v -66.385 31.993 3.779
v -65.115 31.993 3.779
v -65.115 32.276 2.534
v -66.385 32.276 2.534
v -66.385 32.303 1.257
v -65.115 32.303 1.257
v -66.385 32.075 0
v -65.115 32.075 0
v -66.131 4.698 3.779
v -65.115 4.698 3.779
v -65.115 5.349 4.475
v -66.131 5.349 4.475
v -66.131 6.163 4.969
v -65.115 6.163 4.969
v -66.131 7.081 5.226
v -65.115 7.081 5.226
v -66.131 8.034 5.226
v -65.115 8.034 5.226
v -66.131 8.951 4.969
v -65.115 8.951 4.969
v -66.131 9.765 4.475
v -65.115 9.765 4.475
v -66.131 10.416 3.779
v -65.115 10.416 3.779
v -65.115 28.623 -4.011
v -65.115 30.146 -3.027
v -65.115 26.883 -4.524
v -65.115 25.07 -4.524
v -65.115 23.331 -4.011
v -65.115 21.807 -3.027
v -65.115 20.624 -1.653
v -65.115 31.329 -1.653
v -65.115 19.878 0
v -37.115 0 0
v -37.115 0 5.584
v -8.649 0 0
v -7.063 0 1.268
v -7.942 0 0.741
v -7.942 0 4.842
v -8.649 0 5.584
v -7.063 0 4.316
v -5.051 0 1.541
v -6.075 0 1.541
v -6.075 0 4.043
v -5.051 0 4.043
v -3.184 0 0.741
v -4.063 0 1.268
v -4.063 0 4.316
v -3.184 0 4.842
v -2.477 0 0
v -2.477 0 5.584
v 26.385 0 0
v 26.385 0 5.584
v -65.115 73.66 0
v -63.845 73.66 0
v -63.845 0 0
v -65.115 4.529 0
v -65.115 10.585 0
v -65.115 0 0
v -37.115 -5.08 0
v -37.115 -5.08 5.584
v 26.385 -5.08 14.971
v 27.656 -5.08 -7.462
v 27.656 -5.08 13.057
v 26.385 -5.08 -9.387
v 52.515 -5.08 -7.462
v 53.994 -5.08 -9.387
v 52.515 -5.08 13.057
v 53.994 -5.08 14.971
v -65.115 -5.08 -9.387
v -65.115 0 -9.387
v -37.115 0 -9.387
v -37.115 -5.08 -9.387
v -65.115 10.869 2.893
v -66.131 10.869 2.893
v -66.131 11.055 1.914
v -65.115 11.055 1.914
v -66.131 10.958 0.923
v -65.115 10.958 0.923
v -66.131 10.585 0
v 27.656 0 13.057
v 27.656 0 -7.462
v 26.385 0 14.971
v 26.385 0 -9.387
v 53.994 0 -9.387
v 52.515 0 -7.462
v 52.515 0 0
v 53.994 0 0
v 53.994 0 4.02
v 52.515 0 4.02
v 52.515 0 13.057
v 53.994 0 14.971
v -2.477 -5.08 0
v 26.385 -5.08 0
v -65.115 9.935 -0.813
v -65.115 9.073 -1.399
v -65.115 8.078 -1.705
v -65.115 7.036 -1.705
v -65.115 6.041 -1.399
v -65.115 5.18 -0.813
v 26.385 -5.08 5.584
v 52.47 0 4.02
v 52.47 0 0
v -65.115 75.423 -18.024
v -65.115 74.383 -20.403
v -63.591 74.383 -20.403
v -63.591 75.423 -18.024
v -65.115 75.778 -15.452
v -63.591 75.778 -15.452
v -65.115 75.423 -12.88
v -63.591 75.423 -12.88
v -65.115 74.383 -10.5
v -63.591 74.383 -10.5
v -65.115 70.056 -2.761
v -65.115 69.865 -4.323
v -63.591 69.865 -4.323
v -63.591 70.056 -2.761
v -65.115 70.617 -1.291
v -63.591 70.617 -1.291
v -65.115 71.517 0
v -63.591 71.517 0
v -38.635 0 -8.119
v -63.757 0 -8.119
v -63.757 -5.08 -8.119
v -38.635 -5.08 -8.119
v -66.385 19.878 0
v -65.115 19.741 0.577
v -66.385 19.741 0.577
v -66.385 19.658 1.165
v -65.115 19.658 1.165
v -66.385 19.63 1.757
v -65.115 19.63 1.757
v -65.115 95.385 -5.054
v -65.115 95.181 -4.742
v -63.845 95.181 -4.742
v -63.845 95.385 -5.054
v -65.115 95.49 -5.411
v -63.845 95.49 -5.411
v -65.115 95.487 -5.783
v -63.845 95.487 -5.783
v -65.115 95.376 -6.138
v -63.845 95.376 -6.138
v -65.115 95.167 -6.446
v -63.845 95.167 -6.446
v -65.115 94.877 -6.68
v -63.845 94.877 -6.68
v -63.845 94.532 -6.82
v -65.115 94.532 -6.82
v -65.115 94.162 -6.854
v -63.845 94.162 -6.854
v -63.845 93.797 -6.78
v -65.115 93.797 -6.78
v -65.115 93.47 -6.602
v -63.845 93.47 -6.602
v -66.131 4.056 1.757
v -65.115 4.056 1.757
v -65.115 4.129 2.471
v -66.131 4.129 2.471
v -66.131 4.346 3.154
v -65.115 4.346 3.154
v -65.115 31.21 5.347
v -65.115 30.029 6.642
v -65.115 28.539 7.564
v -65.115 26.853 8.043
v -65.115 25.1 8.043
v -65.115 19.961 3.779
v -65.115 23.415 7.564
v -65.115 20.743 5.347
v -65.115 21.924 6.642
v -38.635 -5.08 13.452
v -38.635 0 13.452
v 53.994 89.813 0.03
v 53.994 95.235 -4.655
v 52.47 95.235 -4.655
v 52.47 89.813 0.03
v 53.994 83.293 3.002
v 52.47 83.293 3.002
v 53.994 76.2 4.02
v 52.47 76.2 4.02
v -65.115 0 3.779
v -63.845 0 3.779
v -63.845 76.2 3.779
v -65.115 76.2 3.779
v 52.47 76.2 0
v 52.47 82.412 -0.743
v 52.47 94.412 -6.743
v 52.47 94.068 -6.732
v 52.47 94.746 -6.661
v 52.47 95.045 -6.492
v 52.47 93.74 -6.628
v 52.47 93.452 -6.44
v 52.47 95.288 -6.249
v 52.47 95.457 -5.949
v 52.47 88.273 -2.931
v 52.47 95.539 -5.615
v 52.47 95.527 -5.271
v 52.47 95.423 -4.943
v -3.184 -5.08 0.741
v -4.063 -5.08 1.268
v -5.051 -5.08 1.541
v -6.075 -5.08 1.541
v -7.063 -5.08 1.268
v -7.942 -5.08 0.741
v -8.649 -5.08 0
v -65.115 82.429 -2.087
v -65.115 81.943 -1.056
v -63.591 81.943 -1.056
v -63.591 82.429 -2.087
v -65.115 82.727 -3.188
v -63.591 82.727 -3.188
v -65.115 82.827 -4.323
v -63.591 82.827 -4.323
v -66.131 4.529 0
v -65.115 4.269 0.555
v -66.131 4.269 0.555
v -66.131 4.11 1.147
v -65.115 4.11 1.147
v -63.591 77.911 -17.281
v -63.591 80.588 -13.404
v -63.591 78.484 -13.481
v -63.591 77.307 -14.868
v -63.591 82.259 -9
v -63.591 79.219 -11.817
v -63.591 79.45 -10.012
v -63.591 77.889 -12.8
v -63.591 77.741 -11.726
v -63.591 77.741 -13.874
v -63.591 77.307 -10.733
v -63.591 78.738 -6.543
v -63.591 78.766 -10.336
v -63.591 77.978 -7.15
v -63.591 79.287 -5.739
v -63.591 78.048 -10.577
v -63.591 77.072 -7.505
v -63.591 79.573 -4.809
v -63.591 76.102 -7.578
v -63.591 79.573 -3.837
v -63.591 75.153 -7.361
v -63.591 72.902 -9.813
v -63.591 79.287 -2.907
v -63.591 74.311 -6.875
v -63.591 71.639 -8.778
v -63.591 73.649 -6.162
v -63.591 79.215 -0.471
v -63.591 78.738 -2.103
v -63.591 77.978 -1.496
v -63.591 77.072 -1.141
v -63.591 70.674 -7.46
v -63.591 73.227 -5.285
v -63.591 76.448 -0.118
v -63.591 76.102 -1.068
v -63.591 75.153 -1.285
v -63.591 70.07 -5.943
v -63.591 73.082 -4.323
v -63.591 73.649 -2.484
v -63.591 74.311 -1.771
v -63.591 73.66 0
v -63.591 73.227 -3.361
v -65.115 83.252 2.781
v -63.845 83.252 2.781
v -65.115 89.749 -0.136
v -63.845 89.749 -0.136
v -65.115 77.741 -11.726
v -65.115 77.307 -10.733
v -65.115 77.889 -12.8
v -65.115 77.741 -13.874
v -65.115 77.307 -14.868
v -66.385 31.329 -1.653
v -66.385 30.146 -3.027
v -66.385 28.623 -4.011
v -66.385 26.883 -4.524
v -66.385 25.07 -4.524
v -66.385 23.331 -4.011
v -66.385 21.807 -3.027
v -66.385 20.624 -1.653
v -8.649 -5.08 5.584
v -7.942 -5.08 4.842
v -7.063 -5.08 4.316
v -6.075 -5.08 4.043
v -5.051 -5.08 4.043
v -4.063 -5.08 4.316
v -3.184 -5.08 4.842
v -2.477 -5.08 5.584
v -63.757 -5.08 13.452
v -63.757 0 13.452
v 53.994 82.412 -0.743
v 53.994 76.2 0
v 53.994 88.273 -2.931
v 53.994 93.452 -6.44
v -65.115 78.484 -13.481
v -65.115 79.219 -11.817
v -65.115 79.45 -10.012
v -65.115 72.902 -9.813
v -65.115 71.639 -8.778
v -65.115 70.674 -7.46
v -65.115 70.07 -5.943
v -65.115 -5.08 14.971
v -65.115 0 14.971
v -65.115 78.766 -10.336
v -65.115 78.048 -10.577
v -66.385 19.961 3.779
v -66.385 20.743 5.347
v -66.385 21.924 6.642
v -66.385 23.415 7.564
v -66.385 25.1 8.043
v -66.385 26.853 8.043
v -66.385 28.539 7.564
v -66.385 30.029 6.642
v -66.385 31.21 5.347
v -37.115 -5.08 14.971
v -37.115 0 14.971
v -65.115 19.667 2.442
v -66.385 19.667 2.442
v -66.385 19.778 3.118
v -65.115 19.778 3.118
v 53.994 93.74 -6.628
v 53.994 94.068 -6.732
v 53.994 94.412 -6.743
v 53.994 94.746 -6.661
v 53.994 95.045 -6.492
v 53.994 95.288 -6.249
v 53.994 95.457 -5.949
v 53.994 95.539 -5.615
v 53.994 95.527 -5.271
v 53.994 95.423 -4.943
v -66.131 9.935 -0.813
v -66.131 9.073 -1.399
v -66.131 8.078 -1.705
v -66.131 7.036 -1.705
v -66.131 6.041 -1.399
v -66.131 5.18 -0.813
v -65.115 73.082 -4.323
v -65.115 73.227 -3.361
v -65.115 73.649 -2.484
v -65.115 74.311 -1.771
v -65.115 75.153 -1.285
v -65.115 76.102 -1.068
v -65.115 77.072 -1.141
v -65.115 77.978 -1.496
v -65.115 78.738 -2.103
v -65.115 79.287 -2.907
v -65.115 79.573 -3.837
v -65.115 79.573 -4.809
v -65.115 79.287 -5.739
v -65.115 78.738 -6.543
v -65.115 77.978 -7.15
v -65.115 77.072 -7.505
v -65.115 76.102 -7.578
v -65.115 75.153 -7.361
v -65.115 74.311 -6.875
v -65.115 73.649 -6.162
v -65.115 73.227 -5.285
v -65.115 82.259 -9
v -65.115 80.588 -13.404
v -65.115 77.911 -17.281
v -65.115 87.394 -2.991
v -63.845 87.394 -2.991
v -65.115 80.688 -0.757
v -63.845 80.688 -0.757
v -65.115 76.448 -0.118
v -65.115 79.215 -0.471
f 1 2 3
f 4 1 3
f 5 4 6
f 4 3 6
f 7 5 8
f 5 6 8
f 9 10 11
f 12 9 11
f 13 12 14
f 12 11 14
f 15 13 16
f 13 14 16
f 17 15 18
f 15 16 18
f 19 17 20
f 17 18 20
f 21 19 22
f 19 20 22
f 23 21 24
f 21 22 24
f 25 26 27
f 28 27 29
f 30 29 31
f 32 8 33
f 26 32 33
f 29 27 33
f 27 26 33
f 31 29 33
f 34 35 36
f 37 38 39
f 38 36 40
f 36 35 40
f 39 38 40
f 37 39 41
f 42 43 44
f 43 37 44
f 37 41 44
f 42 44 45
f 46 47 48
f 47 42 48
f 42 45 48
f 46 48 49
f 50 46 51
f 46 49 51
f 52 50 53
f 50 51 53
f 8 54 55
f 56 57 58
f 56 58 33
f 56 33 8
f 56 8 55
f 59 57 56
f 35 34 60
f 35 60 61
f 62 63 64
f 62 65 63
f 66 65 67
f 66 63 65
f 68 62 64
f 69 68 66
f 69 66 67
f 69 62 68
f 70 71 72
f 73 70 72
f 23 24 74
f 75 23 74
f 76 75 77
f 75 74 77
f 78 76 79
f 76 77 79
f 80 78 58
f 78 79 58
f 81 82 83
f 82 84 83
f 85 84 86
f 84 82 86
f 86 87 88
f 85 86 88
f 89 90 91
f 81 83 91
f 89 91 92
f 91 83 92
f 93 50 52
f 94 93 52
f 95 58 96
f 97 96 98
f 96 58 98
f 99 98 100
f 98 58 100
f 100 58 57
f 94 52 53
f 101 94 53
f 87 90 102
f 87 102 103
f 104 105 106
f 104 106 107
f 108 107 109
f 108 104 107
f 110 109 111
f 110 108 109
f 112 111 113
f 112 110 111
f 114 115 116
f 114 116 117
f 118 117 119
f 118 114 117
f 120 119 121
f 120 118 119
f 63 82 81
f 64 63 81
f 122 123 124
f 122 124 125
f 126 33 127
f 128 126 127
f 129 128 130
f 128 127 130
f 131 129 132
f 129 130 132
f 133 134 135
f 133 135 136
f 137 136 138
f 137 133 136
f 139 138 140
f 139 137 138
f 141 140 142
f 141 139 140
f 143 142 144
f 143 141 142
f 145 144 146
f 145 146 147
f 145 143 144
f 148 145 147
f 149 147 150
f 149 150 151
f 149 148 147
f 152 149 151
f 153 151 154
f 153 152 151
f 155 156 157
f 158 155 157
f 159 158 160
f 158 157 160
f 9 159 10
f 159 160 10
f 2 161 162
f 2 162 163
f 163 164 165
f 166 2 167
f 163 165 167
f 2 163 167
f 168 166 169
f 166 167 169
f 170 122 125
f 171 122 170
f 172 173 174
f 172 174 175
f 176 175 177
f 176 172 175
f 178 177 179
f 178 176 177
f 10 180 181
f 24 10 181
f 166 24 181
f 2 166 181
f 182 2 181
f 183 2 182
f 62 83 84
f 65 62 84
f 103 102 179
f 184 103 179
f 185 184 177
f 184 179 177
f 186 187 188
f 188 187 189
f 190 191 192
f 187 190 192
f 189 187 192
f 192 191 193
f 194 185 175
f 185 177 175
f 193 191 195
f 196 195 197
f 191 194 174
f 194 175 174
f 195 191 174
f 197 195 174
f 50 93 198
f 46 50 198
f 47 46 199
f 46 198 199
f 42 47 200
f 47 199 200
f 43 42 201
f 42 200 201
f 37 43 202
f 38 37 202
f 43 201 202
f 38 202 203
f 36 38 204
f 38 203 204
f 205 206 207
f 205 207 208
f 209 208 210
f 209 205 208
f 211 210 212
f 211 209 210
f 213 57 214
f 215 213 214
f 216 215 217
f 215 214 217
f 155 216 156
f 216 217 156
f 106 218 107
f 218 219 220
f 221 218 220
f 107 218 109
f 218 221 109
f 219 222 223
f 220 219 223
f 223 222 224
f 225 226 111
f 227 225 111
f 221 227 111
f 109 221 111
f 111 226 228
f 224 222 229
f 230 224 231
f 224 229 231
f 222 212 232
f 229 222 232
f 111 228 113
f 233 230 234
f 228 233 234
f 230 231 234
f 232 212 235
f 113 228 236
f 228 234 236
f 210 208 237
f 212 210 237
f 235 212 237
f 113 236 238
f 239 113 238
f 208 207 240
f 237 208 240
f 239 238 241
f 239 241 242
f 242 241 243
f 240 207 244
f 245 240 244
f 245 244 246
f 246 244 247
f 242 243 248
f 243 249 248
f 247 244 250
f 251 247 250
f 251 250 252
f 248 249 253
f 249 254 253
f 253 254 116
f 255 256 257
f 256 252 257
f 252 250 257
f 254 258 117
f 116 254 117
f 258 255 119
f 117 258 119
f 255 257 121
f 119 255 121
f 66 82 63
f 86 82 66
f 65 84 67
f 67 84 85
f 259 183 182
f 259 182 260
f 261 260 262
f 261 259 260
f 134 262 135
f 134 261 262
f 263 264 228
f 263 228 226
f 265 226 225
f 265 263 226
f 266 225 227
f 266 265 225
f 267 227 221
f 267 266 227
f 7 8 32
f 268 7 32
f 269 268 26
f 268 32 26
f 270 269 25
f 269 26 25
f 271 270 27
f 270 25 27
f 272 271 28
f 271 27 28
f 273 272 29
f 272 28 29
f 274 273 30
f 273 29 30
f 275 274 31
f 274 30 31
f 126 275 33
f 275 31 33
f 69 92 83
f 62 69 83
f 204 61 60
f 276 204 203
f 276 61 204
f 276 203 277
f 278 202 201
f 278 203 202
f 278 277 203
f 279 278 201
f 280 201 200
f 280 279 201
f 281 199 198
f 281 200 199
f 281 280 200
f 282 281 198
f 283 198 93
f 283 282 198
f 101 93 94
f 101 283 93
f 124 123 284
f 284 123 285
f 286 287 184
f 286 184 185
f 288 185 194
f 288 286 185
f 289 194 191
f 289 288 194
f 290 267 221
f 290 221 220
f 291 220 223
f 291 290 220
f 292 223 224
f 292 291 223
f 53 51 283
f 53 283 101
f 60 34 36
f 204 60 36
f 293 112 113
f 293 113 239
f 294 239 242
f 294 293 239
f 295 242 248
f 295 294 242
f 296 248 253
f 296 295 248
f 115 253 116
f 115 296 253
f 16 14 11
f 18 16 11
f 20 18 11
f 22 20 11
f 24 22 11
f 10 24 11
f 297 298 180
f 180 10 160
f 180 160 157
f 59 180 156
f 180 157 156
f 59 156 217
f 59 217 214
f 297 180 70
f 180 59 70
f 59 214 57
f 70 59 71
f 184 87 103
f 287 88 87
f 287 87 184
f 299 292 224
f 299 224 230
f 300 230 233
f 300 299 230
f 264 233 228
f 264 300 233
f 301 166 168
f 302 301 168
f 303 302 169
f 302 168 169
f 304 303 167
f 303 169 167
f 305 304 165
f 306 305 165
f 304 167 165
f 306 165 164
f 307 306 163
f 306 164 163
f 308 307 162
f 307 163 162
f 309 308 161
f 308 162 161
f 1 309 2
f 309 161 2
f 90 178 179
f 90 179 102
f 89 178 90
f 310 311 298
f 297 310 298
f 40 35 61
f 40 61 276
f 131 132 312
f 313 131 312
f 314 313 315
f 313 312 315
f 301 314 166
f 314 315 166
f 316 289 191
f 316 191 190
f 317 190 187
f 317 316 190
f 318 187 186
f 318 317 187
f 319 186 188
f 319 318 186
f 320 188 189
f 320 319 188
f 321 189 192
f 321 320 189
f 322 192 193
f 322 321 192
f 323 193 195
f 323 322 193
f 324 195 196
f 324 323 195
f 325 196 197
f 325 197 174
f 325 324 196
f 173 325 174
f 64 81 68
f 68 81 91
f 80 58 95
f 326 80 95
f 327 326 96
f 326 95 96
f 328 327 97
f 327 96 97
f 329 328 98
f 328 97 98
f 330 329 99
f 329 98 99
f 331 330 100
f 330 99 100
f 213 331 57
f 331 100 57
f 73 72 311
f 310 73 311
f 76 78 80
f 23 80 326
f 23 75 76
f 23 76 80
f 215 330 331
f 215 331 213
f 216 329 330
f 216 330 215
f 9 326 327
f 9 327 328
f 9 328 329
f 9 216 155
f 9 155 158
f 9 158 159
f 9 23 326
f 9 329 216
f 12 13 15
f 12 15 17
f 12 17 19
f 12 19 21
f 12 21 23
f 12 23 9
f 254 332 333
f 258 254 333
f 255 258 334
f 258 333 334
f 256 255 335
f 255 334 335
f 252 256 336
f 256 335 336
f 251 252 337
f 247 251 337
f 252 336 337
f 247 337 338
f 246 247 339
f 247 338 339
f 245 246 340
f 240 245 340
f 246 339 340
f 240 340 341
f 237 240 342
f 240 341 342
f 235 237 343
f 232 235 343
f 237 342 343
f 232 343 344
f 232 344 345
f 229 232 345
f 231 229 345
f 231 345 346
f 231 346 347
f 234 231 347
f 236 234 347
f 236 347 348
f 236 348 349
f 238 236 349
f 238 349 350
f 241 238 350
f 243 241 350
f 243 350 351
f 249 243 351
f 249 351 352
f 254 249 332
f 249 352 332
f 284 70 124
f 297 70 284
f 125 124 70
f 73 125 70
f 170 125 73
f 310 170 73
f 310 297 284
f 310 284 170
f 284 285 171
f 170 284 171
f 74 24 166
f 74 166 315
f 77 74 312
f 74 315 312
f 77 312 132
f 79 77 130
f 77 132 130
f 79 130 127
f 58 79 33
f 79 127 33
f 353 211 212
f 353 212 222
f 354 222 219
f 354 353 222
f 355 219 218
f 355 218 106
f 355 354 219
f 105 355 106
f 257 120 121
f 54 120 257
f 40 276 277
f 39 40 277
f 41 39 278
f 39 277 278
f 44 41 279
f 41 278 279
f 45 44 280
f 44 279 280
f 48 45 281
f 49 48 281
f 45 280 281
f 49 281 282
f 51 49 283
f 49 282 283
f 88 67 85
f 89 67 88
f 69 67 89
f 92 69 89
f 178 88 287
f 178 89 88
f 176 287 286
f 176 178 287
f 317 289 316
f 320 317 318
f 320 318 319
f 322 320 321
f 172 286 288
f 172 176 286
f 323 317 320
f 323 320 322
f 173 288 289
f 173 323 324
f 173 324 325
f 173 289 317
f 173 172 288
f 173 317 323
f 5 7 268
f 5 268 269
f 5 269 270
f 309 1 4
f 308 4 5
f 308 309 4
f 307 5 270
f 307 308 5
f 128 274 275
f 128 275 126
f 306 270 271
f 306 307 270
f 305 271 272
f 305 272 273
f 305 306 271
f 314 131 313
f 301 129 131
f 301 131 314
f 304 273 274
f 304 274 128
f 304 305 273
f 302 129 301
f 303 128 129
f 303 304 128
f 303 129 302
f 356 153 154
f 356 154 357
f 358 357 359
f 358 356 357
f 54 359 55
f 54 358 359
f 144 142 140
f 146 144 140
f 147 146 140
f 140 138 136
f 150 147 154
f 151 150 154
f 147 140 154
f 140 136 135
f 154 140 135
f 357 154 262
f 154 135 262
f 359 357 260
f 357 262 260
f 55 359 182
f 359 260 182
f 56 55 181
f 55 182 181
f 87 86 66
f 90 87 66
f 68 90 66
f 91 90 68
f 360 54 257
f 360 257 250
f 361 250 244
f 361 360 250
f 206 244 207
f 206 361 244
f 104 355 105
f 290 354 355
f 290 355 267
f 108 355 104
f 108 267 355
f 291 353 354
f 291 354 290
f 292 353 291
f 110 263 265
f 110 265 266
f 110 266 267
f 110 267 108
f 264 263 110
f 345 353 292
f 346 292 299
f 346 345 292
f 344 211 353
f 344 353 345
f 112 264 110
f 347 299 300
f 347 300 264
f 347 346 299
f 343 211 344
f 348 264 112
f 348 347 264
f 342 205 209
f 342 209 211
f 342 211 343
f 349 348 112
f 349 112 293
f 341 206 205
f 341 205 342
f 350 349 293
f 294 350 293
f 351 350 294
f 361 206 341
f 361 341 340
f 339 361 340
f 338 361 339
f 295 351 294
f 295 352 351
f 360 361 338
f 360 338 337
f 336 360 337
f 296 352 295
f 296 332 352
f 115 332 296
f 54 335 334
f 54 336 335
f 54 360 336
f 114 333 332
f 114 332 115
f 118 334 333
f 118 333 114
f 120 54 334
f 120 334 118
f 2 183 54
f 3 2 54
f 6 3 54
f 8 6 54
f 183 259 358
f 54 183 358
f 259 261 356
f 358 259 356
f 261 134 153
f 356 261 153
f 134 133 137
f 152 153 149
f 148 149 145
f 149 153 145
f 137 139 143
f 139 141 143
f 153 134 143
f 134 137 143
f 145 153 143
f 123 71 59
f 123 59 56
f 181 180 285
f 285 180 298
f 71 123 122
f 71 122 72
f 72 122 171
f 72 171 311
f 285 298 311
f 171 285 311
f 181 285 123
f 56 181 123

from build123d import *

# Parameters (mm, degrees)
F0_W      = 24.8591314353
F0_H      = 20.5186494302
F1_DEPTH  = 5.08
F0_W_2    = 25.122191595
F0_H_2    = 21.5708865258
F2_DEPTH  = 5.08
F0_W_3    = 63.5
F0_H_3    = 5.5836134831
F3_DEPTH  = 5.08
F5_DEPTH  = 1.27
F7_DEPTH  = 1.524
F9_DEPTH  = 25.4
F10_R     = 3.2639449121
F11_DEPTH = 1.524
F12_DEPTH = 25.4
F14_DEPTH = 1.016
F15_DEPTH = 1.27


with BuildPart() as f1:
    # F0 (on Front) → F1 (new body)
    with BuildSketch(Plane.XZ):
        Polygon((26.385391636, 14.9705700048), (26.385391636, 5.5836134831), (26.385391636, 0), (26.385391636, -9.3869565217), (53.9940872881, -9.3869565217), (53.9940872881, 14.9705700048), align=None)
        with Locations((40.0855276815, 2.7977904487)):
            Rectangle(F0_W, F0_H, mode=Mode.SUBTRACT)
    extrude(amount=F1_DEPTH)

    # F0 (on Front) → F2 (cut)
    with BuildSketch(Plane.XZ):
        with Locations((-51.196154369, 2.6662601158)):
            Rectangle(F0_W_2, F0_H_2)
        with Locations((40.0855276815, 2.7977904487)):
            Rectangle(F0_W, F0_H)
    extrude(amount=F2_DEPTH, mode=Mode.SUBTRACT)

    # F6 (on face) → F7 (join)
    with BuildSketch(Plane.YZ.offset(53.9940872881)):
        with BuildLine():
            Line((76.2000307441, 4.0195993367), (0, 4.0195993367))
            Line((0, 4.0195993367), (0, 0))
            Line((0, 0), (76.2000307441, 0))
            ThreePointArc((76.2000307441, 0), (85.4073462963, -1.6626049581), (93.451687857, -6.440416568))
            ThreePointArc((93.451687857, -6.440416568), (95.175242601, -6.3789570267), (95.2350281051, -4.6553434028))
            ThreePointArc((95.2350281051, -4.6553434028), (86.6593060066, 1.7486216939), (76.2000307441, 4.0195993367))
        make_face()
    extrude(amount=-F7_DEPTH)

    # F10 (on face) → F12 (cut)
    with BuildSketch(Plane(origin=(-65.1145180239, 0, 0), x_dir=(0, -1, 0), z_dir=(-1, 0, 0))):
        with Locations((-76.3458460569, -4.3230298907)):
            Circle(F10_R)
        with BuildLine():
            ThreePointArc((-77.3066952825, -10.7327000518), (-78.4101509232, -10.4667867403), (-79.450295985, -10.0124493208))
            ThreePointArc((-79.450295985, -10.0124493208), (-78.9112272655, -12.6753163205), (-77.3066952825, -14.8677881807))
            ThreePointArc((-77.3066952825, -14.8677881807), (-77.8892778547, -12.8002441162), (-77.3066952825, -10.7327000518))
        make_face()
    extrude(amount=-F12_DEPTH, mode=Mode.SUBTRACT)


with BuildPart() as f1b:
    # F0 (on Front) → F1, piece 2 (new body)
    with BuildSketch(Plane.XZ):
        Polygon((-37.114608364, 0), (-37.114608364, 5.5836134831), (-37.114608364, 14.9705700048), (-65.1145180239, 14.9705700048), (-65.1145180239, -9.3869565217), (-37.114608364, -9.3869565217), align=None)
        with Locations((-51.196154369, 2.6662601158)):
            Rectangle(F0_W_2, F0_H_2, mode=Mode.SUBTRACT)
    extrude(amount=F1_DEPTH)

    # F4 (on face) → F5 (join)
    with BuildSketch(Plane(origin=(-65.1145180239, 0, 0), x_dir=(0, -1, 0), z_dir=(-1, 0, 0))):
        with BuildLine():
            Line((0, 0), (0, 3.7789882266))
            Line((0, 3.7789882266), (-76.2, 3.7789882266))
            ThreePointArc((-76.2, 3.7789882266), (-86.6030038133, 1.5509003545), (-95.1809047422, -4.7424675481))
            ThreePointArc((-95.1809047422, -4.7424675481), (-95.1665474178, -6.4461961933), (-93.4699387827, -6.6024542127))
            ThreePointArc((-93.4699387827, -6.6024542127), (-84.1006187102, -1.6940701503), (-73.66, 0))
            Line((-73.66, 0), (0, 0))
        make_face()
    extrude(amount=-F5_DEPTH)

    # F13 (on face) → F14 (join)
    with BuildSketch(Plane(origin=(-65.1145180239, 0, 0), x_dir=(0, -1, 0), z_dir=(-1, 0, 0))):
        with BuildLine():
            ThreePointArc((-10.585440284, 0), (-7.557160221, -1.7438445264), (-4.528880158, 0))
            Line((-4.528880158, 0), (-10.585440284, 0))
        make_face()
        with BuildLine():
            ThreePointArc((-4.528880158, 0), (-4.1761766544, 0.847458933), (-4.0558521379, 1.7574635567))
            ThreePointArc((-4.0558521379, 1.7574635567), (-4.2203495123, 2.8180542352), (-4.698384906, 3.7789882266))
            Line((-4.698384906, 3.7789882266), (-10.4159355361, 3.7789882266))
            ThreePointArc((-10.4159355361, 3.7789882266), (-11.0549514184, 1.9143553435), (-10.585440284, 0))
            Line((-10.585440284, 0), (-4.528880158, 0))
        make_face()
        with BuildLine():
            Line((-10.4159355361, 3.7789882266), (-4.698384906, 3.7789882266))
            ThreePointArc((-4.698384906, 3.7789882266), (-7.557160221, 5.2587716399), (-10.4159355361, 3.7789882266))
        make_face()
    extrude(amount=F14_DEPTH)

    # F13 (on face) → F15 (join)
    with BuildSketch(Plane(origin=(-65.1145180239, 0, 0), x_dir=(0, -1, 0), z_dir=(-1, 0, 0))):
        with BuildLine():
            ThreePointArc((-32.0749622812, 0), (-25.9767286479, -4.5889631228), (-19.8784950147, 0))
            Line((-19.8784950147, 0), (-32.0749622812, 0))
        make_face()
        with BuildLine():
            ThreePointArc((-19.6303019684, 1.7574635567), (-19.7134888719, 2.7816506035), (-19.9608688085, 3.7789882266))
            Line((-19.9608688085, 3.7789882266), (-31.9925884874, 3.7789882266))
            ThreePointArc((-31.9925884874, 3.7789882266), (-32.321648125, 1.8957691183), (-32.0749622812, 0))
            Line((-32.0749622812, 0), (-19.8784950147, 0))
            ThreePointArc((-19.8784950147, 0), (-19.6926565515, 0.8700124396), (-19.6303019684, 1.7574635567))
        make_face()
        with BuildLine():
            Line((-31.9925884874, 3.7789882266), (-19.9608688085, 3.7789882266))
            ThreePointArc((-19.9608688085, 3.7789882266), (-25.9767286479, 8.1038902362), (-31.9925884874, 3.7789882266))
        make_face()
    extrude(amount=F15_DEPTH)


with BuildPart() as f3:
    # F0 (on Front) → F3 (new body)
    with BuildSketch(Plane.XZ):
        with Locations((-5.364608364, 2.7918067415)):
            Rectangle(F0_W_3, F0_H_3)
    extrude(amount=F3_DEPTH)

    # F8 (on face) → F9 (cut)
    with BuildSketch(Plane.XZ.offset(5.08)):
        with BuildLine():
            Line((-2.4771525059, 5.5836134831), (-8.6485305801, 5.5836134831))
            ThreePointArc((-8.6485305801, 5.5836134831), (-5.562841543, 4.0084788406), (-2.4771525059, 5.5836134831))
        make_face()
        with BuildLine():
            ThreePointArc((-2.4771525059, 0), (-5.562841543, 1.5751346425), (-8.6485305801, 0))
            Line((-8.6485305801, 0), (-2.4771525059, 0))
        make_face()
    extrude(amount=-F9_DEPTH, mode=Mode.SUBTRACT)


with BuildPart() as f11:
    # F10 (on face) → F11 (new body)
    with BuildSketch(Plane(origin=(-65.1145180239, 0, 0), x_dir=(0, -1, 0), z_dir=(-1, 0, 0))):
        with BuildLine():
            ThreePointArc((-81.9434158877, -1.0558729005), (-82.602305468, -2.6307478676), (-82.8271347257, -4.3230298907))
            ThreePointArc((-82.8271347257, -4.3230298907), (-81.9193520877, -7.6310705998), (-79.450295985, -10.0124493208))
            ThreePointArc((-79.450295985, -10.0124493208), (-78.4101509232, -10.4667867403), (-77.3066952825, -10.7327000518))
            ThreePointArc((-77.3066952825, -10.7327000518), (-75.8317193013, -10.783894886), (-74.3834020992, -10.5000774476))
            ThreePointArc((-74.3834020992, -10.5000774476), (-71.1148677261, -8.1497737429), (-69.8645573881, -4.3230298907))
            ThreePointArc((-69.8645573881, -4.3230298907), (-70.2917251946, -2.0090023644), (-71.5169211898, 0))
            Line((-71.5169211898, 0), (-73.66, 0))
            ThreePointArc((-73.66, 0), (-77.8352199448, -0.2650318515), (-81.9434158877, -1.0558729005))
        make_face()
        with Locations((-76.3458460569, -4.3230298907)):
            Circle(F10_R, mode=Mode.SUBTRACT)
        with BuildLine():
            ThreePointArc((-79.450295985, -10.0124493208), (-81.9193520877, -7.6310705998), (-82.8271347257, -4.3230298907))
            ThreePointArc((-82.8271347257, -4.3230298907), (-80.587849375, -13.4042673338), (-74.3834020992, -20.4034177381))
            ThreePointArc((-74.3834020992, -20.4034177381), (-75.7780304506, -15.4517475929), (-74.3834020992, -10.5000774476))
            ThreePointArc((-74.3834020992, -10.5000774476), (-75.8317193013, -10.783894886), (-77.3066952825, -10.7327000518))
            ThreePointArc((-77.3066952825, -10.7327000518), (-77.8892778547, -12.8002441162), (-77.3066952825, -14.8677881807))
            ThreePointArc((-77.3066952825, -14.8677881807), (-78.9112272655, -12.6753163205), (-79.450295985, -10.0124493208))
        make_face()
    extrude(amount=-F11_DEPTH)


solid = Compound([f1.part, f1b.part, f3.part, f11.part])
